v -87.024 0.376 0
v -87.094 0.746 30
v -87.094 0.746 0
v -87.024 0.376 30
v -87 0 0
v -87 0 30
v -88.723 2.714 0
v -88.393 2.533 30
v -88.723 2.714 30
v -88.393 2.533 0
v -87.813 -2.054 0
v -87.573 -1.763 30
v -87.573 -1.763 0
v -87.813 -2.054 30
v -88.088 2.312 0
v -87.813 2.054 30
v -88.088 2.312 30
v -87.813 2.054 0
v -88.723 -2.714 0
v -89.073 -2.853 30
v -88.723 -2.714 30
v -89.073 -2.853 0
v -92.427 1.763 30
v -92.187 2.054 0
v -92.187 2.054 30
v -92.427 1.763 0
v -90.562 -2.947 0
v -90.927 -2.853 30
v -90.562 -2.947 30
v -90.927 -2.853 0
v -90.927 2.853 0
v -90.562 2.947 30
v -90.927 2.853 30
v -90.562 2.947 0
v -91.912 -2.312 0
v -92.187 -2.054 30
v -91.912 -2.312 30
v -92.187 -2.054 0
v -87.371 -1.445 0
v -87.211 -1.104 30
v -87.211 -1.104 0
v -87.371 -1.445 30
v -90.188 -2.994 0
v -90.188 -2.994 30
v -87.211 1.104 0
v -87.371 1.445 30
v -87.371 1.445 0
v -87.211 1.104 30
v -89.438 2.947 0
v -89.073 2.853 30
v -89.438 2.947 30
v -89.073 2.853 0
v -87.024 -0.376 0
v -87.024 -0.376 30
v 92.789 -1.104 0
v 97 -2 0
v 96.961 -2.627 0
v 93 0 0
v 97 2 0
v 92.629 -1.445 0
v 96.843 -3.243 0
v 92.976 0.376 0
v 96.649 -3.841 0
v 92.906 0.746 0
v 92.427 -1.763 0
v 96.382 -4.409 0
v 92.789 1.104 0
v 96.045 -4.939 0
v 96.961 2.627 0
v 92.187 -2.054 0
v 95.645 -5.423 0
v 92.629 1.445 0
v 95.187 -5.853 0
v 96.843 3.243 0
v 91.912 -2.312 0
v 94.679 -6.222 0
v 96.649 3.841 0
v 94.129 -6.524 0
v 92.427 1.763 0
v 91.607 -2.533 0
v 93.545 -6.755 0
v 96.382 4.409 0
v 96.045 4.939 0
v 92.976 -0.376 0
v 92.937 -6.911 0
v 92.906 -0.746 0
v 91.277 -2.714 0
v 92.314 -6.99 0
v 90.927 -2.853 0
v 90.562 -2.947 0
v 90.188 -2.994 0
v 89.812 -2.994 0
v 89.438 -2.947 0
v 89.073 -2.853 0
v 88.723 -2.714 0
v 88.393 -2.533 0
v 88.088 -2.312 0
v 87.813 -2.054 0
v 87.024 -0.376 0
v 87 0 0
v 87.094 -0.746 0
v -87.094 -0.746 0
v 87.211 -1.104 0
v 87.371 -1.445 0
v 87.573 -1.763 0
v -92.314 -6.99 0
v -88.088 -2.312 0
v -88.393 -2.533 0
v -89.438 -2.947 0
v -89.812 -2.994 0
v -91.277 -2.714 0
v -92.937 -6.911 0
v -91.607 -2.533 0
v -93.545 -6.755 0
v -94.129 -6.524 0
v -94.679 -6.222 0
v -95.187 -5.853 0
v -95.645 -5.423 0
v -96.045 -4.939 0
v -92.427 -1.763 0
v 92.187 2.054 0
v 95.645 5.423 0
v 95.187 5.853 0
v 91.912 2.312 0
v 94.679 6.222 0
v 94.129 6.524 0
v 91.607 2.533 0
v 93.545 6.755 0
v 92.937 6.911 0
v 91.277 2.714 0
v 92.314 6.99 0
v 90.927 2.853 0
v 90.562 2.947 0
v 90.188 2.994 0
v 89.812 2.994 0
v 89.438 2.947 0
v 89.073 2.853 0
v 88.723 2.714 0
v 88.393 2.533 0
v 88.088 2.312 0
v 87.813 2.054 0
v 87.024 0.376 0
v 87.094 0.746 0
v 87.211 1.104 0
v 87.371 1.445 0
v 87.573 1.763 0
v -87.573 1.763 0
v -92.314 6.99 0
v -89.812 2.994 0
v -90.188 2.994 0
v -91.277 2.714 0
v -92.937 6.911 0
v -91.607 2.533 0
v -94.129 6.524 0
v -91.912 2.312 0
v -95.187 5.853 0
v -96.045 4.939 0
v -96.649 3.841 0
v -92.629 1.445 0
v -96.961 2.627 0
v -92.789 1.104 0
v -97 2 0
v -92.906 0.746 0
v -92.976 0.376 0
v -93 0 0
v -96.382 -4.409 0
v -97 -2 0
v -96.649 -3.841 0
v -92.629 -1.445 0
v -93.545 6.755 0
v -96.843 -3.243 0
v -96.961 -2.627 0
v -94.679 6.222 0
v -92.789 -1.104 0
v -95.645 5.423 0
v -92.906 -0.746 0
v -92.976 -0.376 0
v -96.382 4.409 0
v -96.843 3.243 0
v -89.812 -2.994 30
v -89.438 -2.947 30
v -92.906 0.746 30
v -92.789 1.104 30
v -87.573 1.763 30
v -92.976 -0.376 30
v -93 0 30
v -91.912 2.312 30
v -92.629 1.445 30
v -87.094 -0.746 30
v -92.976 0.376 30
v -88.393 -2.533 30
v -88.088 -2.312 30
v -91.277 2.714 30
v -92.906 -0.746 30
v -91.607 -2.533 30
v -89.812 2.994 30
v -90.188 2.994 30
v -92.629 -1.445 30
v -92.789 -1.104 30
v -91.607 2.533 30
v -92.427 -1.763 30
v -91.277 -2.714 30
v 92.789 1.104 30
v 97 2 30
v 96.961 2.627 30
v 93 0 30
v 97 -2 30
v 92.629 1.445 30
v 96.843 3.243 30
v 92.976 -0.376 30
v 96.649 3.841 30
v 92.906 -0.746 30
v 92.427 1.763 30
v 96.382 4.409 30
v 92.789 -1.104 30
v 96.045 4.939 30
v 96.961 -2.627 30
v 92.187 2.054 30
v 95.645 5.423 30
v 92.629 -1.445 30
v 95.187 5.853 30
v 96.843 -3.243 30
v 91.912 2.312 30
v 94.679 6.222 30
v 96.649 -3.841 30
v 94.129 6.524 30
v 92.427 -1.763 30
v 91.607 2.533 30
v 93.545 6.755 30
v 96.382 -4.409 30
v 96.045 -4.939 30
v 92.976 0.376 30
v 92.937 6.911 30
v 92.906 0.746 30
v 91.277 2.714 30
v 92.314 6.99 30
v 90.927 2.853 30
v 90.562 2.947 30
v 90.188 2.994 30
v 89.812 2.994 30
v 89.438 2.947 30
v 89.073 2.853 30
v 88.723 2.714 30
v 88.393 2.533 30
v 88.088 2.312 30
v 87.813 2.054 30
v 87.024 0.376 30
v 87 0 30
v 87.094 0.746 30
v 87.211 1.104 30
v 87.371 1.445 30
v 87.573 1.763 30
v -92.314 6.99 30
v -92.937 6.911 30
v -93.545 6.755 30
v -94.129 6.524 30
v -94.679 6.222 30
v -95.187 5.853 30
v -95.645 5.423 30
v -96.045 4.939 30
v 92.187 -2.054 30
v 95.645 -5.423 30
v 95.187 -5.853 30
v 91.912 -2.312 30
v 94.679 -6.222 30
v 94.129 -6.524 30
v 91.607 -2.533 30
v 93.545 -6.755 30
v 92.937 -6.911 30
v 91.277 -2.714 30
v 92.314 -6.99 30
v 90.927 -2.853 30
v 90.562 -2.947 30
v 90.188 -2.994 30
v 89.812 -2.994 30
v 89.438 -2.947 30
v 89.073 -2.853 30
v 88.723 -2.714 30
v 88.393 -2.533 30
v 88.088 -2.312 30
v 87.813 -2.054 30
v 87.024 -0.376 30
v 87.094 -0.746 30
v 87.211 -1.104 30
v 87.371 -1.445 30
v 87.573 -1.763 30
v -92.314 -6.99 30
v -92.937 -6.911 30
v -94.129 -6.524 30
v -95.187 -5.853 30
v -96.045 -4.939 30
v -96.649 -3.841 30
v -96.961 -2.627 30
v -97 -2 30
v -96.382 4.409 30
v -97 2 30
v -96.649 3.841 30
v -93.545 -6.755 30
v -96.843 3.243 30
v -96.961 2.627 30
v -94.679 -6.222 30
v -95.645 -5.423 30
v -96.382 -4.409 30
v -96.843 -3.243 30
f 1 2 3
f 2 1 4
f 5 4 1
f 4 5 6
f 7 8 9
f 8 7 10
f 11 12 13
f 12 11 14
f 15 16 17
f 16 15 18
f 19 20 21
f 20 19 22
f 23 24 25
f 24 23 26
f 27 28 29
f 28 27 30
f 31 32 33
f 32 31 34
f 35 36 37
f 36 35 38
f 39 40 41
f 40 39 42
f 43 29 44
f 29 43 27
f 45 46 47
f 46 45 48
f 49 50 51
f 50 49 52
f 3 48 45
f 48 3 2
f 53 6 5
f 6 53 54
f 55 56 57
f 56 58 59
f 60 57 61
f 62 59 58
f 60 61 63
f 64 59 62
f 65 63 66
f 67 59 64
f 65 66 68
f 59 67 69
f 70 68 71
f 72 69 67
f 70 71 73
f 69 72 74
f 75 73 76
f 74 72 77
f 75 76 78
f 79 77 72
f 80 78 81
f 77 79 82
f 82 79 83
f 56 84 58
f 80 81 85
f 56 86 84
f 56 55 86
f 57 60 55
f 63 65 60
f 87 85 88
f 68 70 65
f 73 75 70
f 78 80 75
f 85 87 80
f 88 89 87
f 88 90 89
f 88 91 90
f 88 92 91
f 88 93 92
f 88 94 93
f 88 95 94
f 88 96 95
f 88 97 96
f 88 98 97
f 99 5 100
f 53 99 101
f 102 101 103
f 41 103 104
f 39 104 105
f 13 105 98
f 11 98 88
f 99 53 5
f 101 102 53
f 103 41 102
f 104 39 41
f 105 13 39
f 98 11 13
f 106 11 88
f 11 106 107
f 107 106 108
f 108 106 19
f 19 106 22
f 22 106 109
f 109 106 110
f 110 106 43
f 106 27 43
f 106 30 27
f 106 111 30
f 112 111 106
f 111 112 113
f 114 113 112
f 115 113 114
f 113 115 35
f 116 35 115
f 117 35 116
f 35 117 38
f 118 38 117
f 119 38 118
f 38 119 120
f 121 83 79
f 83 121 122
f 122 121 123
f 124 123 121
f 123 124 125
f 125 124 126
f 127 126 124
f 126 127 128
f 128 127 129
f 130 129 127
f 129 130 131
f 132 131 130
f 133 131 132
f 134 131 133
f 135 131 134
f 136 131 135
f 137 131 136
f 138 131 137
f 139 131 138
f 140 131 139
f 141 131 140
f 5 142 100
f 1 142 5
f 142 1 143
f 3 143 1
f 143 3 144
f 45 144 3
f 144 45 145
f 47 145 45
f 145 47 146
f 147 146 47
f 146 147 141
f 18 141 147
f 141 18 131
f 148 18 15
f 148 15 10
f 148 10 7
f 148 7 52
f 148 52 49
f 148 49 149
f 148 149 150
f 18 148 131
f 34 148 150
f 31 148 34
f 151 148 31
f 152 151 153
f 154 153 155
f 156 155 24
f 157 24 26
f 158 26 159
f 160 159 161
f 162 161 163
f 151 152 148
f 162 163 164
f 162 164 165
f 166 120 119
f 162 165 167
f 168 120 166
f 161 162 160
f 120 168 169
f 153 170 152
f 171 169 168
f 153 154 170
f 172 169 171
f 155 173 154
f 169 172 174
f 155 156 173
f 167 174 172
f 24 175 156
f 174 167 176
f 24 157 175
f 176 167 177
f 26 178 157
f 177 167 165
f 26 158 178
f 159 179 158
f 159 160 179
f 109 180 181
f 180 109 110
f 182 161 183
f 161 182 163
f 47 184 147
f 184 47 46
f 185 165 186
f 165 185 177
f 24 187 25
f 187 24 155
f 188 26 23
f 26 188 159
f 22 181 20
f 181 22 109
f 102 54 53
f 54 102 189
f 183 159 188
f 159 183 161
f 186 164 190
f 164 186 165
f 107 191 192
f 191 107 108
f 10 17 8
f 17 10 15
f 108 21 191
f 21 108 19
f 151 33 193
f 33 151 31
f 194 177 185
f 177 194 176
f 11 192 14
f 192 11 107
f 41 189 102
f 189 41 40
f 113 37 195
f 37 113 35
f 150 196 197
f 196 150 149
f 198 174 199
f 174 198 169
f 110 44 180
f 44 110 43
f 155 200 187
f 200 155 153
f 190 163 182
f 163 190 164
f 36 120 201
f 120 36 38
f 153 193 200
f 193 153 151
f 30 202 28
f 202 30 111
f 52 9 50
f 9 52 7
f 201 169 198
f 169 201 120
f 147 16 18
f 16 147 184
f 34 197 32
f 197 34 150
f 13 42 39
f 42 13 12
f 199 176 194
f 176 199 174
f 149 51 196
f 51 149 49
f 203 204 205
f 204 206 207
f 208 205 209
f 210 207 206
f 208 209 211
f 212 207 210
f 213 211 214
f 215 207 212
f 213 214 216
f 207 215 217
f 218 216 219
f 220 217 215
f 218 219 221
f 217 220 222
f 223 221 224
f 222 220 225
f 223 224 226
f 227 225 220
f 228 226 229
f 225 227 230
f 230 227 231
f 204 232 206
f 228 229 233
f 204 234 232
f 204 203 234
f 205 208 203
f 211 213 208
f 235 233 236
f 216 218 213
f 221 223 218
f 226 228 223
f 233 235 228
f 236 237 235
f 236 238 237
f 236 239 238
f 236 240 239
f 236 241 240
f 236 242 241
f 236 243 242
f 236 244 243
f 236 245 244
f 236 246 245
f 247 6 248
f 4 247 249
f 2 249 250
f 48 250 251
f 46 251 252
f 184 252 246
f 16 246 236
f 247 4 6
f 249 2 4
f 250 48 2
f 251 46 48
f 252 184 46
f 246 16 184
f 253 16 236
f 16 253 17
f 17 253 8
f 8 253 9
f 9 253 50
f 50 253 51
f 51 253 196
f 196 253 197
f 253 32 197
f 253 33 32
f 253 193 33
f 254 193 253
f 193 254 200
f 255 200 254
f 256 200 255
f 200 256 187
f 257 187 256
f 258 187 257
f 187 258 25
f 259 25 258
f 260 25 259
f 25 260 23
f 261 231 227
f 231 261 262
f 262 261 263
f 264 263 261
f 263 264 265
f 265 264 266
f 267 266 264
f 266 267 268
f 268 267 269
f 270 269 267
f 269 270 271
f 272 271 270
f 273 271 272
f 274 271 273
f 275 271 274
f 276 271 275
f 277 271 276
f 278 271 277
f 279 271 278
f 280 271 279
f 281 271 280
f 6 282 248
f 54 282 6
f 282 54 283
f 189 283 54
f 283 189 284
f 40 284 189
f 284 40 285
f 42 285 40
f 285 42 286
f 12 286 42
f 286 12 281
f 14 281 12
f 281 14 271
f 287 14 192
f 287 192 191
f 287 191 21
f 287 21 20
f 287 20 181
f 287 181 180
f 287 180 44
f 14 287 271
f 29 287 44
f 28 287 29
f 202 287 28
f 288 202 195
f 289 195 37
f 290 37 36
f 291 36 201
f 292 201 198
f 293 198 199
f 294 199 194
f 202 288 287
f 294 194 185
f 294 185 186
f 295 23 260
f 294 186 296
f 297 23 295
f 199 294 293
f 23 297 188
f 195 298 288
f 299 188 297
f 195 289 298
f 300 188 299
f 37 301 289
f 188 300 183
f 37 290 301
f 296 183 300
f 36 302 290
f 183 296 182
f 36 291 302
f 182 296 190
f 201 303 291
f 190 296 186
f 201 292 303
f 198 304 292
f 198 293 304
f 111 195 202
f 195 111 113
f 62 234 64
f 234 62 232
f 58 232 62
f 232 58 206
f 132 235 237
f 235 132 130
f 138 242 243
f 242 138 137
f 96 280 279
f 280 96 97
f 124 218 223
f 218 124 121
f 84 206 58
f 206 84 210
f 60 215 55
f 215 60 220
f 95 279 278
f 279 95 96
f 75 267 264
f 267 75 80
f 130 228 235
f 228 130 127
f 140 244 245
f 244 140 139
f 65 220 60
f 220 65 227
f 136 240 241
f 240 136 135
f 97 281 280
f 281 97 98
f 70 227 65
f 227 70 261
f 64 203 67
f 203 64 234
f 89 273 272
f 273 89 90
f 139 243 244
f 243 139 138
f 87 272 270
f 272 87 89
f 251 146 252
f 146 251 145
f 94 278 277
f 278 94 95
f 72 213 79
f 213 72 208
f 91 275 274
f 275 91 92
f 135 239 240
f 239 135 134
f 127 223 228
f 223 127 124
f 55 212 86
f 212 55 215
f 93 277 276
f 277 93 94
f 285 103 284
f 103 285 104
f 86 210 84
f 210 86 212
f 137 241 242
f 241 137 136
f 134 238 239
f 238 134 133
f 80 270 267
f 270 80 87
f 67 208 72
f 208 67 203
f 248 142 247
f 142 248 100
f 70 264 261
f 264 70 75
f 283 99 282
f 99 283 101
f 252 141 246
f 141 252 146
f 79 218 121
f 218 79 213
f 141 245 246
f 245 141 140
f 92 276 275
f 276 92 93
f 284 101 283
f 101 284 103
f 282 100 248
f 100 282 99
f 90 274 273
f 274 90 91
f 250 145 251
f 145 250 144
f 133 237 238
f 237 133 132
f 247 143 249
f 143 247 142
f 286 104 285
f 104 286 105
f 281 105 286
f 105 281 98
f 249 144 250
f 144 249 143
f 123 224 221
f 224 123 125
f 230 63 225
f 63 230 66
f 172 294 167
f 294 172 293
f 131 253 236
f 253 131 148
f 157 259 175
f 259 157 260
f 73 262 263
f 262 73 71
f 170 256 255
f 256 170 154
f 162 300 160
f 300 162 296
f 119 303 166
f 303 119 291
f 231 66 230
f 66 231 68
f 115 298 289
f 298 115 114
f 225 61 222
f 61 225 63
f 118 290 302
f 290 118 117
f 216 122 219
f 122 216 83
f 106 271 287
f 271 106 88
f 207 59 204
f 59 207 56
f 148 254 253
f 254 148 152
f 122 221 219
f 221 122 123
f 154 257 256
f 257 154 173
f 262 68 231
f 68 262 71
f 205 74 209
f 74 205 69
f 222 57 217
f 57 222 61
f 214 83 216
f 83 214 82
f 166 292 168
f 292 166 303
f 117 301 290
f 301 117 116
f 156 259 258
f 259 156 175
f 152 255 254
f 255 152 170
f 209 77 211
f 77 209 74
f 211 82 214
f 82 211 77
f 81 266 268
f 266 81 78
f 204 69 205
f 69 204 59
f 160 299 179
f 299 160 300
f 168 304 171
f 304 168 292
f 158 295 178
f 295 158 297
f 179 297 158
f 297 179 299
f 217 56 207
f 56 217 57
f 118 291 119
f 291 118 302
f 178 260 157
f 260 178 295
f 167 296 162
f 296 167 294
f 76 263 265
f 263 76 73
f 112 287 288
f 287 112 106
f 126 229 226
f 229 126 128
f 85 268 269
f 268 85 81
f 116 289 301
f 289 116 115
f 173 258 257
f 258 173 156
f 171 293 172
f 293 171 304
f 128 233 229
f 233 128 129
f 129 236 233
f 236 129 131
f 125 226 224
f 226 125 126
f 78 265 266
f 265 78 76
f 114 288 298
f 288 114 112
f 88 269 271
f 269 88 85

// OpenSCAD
$fn = 50;


difference() {
	union() {
		hull() {
			translate(v = [-92.0000000000, 2.0000000000, 0]) {
				cylinder(h = 30, r = 5);
			}
			translate(v = [92.0000000000, 2.0000000000, 0]) {
				cylinder(h = 30, r = 5);
			}
			translate(v = [-92.0000000000, -2.0000000000, 0]) {
				cylinder(h = 30, r = 5);
			}
			translate(v = [92.0000000000, -2.0000000000, 0]) {
				cylinder(h = 30, r = 5);
			}
		}
	}
	union() {
		translate(v = [-90.0000000000, 0.0000000000, 0]) {
			cylinder(h = 30, r = 3.0000000000);
		}
		translate(v = [90.0000000000, 0.0000000000, 0]) {
			cylinder(h = 30, r = 3.0000000000);
		}
		translate(v = [-90.0000000000, 0.0000000000, 0]) {
			cylinder(h = 30, r = 1.5000000000);
		}
		translate(v = [90.0000000000, 0.0000000000, 0]) {
			cylinder(h = 30, r = 1.5000000000);
		}
		translate(v = [-90.0000000000, 0.0000000000, 0]) {
			cylinder(h = 30, r = 1.5000000000);
		}
		translate(v = [90.0000000000, 0.0000000000, 0]) {
			cylinder(h = 30, r = 1.5000000000);
		}
		translate(v = [-90.0000000000, 0.0000000000, 0]) {
			cylinder(h = 30, r = 1.5000000000);
		}
		translate(v = [90.0000000000, 0.0000000000, 0]) {
			cylinder(h = 30, r = 1.5000000000);
		}
	}
}
